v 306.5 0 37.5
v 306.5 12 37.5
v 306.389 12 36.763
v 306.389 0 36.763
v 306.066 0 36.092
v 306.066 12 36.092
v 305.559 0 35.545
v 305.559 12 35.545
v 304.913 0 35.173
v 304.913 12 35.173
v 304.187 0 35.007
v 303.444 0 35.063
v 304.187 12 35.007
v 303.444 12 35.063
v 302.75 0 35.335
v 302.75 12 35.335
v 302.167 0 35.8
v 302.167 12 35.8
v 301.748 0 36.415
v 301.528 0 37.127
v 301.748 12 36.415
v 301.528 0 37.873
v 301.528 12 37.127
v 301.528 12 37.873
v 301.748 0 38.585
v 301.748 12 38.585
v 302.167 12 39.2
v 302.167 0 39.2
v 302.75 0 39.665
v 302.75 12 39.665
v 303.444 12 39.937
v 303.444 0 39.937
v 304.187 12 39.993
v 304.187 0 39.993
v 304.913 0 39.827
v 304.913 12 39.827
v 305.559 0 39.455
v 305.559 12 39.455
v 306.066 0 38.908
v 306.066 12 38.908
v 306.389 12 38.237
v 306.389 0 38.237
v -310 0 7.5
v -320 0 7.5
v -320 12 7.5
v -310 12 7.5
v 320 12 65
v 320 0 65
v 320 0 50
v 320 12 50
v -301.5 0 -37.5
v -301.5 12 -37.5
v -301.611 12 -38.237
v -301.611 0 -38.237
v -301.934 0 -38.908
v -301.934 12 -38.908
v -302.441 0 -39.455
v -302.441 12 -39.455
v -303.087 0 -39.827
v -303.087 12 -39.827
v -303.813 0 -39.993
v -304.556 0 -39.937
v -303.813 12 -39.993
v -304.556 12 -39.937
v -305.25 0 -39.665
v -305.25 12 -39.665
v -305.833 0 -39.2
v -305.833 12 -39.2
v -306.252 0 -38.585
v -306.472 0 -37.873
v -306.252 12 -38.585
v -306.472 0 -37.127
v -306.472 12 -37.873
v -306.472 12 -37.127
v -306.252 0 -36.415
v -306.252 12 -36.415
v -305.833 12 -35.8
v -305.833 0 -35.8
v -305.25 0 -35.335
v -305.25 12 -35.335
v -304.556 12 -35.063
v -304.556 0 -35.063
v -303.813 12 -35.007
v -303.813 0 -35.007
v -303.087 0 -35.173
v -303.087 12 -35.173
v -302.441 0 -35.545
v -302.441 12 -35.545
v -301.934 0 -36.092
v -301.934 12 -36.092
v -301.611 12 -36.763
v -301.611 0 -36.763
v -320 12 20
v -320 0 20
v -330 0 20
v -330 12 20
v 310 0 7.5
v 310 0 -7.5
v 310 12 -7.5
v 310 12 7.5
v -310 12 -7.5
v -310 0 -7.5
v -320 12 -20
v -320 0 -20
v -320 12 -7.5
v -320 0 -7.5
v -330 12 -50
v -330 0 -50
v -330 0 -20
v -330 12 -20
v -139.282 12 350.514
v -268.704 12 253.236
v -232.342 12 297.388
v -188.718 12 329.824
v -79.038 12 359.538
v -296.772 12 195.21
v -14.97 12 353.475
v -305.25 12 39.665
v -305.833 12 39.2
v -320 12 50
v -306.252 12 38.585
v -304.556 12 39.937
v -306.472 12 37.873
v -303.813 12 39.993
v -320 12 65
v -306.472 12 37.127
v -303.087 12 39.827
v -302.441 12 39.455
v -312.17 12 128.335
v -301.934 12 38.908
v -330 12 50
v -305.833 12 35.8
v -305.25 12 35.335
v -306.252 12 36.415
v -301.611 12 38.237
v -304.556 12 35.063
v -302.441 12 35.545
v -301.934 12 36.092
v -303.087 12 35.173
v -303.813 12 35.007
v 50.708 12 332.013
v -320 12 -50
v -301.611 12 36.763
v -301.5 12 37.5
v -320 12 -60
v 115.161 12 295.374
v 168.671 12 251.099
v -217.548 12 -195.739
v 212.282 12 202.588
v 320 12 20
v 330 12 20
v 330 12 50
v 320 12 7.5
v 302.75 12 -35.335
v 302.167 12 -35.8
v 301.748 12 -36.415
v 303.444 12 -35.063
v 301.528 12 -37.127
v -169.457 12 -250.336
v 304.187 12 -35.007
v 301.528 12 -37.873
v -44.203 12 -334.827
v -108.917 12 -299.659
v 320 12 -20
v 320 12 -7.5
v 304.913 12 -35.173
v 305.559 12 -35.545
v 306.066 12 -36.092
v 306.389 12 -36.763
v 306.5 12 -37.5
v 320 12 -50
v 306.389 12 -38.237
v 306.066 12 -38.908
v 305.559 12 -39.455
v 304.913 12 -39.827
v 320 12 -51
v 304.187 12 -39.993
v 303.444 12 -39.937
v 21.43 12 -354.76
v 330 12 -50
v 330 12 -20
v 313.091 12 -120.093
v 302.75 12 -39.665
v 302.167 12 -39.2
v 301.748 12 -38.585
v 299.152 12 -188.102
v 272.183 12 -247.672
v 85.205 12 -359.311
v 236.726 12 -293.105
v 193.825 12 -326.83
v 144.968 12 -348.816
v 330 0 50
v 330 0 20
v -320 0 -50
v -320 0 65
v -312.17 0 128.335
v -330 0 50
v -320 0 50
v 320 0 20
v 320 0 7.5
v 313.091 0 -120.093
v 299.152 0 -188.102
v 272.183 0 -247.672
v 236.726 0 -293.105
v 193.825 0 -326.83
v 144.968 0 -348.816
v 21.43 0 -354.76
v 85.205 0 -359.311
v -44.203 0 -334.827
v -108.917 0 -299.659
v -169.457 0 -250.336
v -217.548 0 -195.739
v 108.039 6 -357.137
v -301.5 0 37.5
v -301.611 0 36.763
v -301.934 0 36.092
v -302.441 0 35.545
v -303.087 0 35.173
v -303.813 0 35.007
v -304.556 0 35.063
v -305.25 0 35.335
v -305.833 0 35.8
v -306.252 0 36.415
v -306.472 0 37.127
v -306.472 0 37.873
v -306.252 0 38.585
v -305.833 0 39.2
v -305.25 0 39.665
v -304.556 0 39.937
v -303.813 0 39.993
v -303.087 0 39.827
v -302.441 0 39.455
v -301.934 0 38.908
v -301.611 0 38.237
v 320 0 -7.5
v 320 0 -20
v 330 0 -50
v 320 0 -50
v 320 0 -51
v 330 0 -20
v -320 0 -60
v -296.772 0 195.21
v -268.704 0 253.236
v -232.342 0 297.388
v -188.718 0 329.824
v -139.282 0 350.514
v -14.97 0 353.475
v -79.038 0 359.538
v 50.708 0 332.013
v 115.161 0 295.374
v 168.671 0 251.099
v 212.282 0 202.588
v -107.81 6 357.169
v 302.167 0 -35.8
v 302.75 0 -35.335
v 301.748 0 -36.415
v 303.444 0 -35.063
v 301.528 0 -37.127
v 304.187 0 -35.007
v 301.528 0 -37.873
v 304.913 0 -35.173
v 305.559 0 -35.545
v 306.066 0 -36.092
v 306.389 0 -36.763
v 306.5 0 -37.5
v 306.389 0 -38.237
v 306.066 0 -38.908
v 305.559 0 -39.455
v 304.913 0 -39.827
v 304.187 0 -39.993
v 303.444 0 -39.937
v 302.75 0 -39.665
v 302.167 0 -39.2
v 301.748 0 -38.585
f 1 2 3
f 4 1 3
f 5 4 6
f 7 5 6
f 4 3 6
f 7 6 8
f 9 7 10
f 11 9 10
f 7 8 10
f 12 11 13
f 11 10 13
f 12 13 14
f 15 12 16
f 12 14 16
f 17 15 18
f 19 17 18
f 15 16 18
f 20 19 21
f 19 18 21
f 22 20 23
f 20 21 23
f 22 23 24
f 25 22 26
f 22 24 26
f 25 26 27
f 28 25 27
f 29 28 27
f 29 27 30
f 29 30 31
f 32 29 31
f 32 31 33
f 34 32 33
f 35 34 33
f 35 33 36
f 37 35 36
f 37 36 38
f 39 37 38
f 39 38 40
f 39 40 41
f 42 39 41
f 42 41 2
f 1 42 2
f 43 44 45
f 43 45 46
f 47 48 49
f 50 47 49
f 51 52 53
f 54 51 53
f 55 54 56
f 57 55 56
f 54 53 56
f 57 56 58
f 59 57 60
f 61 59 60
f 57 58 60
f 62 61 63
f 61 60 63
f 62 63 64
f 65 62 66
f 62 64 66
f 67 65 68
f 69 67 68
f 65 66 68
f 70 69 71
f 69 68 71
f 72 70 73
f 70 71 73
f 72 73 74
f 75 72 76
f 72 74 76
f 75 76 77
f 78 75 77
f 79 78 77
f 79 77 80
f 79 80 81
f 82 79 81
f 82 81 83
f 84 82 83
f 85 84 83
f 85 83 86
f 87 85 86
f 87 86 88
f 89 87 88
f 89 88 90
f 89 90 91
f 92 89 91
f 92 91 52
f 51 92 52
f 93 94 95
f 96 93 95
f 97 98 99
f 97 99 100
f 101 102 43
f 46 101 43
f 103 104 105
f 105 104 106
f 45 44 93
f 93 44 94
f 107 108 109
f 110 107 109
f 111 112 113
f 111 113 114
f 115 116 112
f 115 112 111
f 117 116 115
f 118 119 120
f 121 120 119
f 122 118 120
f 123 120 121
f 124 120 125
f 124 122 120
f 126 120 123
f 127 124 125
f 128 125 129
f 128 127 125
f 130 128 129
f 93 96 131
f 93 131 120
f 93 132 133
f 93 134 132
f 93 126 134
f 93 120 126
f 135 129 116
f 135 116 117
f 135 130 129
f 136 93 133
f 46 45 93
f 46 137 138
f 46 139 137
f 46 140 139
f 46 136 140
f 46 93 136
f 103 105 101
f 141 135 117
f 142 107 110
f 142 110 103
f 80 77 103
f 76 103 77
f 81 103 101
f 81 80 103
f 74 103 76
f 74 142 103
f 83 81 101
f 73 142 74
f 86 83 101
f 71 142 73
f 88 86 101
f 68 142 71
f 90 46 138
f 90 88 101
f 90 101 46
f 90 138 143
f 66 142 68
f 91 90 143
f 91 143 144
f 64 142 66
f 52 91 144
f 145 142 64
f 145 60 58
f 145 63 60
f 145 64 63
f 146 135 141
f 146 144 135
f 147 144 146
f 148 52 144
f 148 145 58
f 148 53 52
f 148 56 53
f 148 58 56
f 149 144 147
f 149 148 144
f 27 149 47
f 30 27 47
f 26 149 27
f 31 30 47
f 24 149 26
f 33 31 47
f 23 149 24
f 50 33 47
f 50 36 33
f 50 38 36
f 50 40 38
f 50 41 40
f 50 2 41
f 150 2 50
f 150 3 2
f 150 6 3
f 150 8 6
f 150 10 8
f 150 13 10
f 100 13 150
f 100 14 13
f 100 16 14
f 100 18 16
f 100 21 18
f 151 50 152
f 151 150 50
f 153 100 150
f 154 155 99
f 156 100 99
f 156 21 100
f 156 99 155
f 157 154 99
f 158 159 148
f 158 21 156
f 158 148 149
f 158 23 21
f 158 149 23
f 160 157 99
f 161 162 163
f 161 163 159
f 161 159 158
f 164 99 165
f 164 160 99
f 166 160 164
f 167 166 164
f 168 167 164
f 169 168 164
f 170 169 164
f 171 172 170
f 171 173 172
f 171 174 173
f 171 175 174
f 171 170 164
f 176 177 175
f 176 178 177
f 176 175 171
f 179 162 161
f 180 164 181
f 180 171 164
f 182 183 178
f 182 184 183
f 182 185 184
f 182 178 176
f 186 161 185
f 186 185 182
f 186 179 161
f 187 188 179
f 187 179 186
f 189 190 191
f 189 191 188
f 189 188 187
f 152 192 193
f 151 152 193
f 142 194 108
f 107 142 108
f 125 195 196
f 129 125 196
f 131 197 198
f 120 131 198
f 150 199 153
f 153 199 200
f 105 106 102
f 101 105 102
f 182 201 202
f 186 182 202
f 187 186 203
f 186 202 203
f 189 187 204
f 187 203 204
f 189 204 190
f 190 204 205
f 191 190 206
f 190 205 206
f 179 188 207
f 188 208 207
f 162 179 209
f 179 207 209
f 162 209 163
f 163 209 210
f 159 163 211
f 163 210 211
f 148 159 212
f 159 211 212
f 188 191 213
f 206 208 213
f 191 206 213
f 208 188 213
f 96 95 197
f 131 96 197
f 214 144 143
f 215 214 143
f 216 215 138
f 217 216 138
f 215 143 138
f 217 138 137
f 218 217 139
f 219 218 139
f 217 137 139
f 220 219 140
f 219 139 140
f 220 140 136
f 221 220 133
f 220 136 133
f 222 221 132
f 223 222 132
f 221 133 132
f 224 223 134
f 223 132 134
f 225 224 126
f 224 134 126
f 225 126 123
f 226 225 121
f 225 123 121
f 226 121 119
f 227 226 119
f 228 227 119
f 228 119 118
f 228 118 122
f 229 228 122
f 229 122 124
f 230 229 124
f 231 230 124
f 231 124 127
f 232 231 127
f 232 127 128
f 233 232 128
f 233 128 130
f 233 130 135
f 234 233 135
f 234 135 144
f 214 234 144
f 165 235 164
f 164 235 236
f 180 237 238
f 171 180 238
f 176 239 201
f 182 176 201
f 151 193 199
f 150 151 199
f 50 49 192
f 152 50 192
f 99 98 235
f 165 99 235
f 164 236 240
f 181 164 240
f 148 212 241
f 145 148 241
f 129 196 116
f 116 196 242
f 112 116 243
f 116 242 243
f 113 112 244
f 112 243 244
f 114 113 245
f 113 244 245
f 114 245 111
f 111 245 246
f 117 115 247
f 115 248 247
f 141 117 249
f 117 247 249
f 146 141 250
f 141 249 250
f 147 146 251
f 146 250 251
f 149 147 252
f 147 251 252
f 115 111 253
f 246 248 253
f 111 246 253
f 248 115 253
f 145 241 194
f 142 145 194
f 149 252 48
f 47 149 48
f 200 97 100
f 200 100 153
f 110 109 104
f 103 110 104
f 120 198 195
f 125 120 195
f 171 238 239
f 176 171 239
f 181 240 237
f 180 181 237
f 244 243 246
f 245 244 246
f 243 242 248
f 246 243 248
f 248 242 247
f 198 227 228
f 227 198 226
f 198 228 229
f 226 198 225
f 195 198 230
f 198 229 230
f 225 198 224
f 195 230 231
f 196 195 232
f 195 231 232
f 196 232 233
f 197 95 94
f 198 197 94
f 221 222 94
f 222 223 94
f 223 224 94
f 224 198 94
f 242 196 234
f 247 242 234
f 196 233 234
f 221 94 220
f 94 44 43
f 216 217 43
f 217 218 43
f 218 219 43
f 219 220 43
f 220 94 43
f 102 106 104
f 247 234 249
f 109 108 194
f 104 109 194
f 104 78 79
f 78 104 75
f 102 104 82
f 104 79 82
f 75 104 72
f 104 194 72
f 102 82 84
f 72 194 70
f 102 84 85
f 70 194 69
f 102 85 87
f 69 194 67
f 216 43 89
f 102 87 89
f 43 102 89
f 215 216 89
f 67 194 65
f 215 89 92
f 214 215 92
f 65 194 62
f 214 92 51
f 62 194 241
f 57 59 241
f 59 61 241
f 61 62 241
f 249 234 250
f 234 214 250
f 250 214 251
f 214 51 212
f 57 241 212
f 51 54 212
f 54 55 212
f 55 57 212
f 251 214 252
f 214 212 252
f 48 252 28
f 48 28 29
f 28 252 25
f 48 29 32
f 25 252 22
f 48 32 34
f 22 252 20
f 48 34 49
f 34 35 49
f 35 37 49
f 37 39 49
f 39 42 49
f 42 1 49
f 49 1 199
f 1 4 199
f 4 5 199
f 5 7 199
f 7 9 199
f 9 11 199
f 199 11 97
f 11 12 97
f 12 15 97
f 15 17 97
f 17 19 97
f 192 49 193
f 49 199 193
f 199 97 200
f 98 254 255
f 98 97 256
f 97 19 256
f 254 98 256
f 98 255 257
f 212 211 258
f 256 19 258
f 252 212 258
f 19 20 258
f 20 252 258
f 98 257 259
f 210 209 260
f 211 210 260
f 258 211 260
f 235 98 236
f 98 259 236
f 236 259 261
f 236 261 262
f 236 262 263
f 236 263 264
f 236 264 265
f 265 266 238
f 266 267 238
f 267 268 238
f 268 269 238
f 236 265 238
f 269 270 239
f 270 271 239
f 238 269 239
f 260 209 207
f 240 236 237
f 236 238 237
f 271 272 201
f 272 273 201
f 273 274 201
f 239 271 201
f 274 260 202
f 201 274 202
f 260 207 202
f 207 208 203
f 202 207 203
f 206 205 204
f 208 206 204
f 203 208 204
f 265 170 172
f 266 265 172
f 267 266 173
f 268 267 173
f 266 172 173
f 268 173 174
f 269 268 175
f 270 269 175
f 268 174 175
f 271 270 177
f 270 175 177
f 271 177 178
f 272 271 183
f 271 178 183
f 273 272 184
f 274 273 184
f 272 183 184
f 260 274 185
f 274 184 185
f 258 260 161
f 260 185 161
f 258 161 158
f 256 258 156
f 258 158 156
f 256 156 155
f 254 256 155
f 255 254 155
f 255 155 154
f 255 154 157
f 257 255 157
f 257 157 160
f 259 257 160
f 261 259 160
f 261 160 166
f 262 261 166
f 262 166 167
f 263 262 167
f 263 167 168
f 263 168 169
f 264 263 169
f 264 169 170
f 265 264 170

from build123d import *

# Parameters (mm, degrees)
BOSS_EXTRUDE1_DEPTH          = 12
SKETCH2_W                    = 10
SKETCH2_H                    = 15
CUT_EXTRUDE1_DEPTH           = 12
F_5_0_5_DIAMETER_HOLE2_D     = 5
F_5_0_5_DIAMETER_HOLE2_DEPTH = 25
F_5_0_5_DIAMETER_HOLE2_TIP   = 1.502151548


with BuildPart() as part:
    # Sketch1 → Boss-Extrude1 (new body)
    with BuildSketch(Plane(origin=(0, 0, 0), x_dir=(1, 0, 0), z_dir=(0, 1, 0))):
        with BuildLine():
            Line((-320, -65), (-312.170159719, -128.33520269))
            add(Edge.make_bspline(
                [(-312.170159719, -128.33520269), (-232.721291269, -770.993291043), (212.28214963, -202.588475219)],
                knots=[5.492316601, 5.492316601, 5.492316601, 7.67057167, 7.67057167, 7.67057167], degree=2, weights=[1, 0.463258742, 1]))
            Line((212.28214963, -202.588475219), (320, -65))
            Line((320, -65), (320, -50))
            Line((320, -50), (330, -50))
            Line((330, -50), (330, -20))
            Line((330, -20), (320, -20))
            Line((320, -20), (320, 20))
            Line((320, 20), (330, 20))
            Line((330, 20), (330, 50))
            Line((330, 50), (320, 50))
            Line((320, 50), (320, 51))
            Line((320, 51), (313.091302172, 120.09271769))
            add(Edge.make_bspline(
                [(313.091302172, 120.09271769), (244.337364097, 807.689215884), (-217.547896668, 195.738545202)],
                knots=[2.326299806, 2.326299806, 2.326299806, 4.55185667, 4.55185667, 4.55185667], degree=2, weights=[1, 0.442171166, 1]))
            Line((-217.547896668, 195.738545202), (-320, 60))
            Line((-320, 60), (-320, 50))
            Line((-320, 50), (-330, 50))
            Line((-330, 50), (-330, 20))
            Line((-330, 20), (-320, 20))
            Line((-320, 20), (-320, -20))
            Line((-320, -20), (-330, -20))
            Line((-330, -20), (-330, -50))
            Line((-330, -50), (-320, -50))
            Line((-320, -50), (-320, -65))
        make_face()
    extrude(amount=BOSS_EXTRUDE1_DEPTH)

    # Sketch2 → Cut-Extrude1 (cut)
    with BuildSketch(Plane.XZ):
        with Locations((315, 0)):
            Rectangle(SKETCH2_W, SKETCH2_H)
        with Locations((-315, 0)):
            Rectangle(SKETCH2_W, SKETCH2_H)
    extrude(amount=-CUT_EXTRUDE1_DEPTH, mode=Mode.SUBTRACT)

    # Ø5.0 (5) Diameter Hole2
    with Locations(Plane(origin=(0, -12, 0), x_dir=(-1, 0, 0), z_dir=(0, -1, 0))):
        with Locations((304, 37.5), (304, -37.5), (-304, -37.5), (-304, 37.5)):
            Hole(F_5_0_5_DIAMETER_HOLE2_D / 2, depth=F_5_0_5_DIAMETER_HOLE2_DEPTH)
            with Locations((0, 0, -(F_5_0_5_DIAMETER_HOLE2_DEPTH + F_5_0_5_DIAMETER_HOLE2_TIP / 2))):  # 118° drill point
                Cone(0, F_5_0_5_DIAMETER_HOLE2_D / 2, F_5_0_5_DIAMETER_HOLE2_TIP, mode=Mode.SUBTRACT)


solid = part.part
